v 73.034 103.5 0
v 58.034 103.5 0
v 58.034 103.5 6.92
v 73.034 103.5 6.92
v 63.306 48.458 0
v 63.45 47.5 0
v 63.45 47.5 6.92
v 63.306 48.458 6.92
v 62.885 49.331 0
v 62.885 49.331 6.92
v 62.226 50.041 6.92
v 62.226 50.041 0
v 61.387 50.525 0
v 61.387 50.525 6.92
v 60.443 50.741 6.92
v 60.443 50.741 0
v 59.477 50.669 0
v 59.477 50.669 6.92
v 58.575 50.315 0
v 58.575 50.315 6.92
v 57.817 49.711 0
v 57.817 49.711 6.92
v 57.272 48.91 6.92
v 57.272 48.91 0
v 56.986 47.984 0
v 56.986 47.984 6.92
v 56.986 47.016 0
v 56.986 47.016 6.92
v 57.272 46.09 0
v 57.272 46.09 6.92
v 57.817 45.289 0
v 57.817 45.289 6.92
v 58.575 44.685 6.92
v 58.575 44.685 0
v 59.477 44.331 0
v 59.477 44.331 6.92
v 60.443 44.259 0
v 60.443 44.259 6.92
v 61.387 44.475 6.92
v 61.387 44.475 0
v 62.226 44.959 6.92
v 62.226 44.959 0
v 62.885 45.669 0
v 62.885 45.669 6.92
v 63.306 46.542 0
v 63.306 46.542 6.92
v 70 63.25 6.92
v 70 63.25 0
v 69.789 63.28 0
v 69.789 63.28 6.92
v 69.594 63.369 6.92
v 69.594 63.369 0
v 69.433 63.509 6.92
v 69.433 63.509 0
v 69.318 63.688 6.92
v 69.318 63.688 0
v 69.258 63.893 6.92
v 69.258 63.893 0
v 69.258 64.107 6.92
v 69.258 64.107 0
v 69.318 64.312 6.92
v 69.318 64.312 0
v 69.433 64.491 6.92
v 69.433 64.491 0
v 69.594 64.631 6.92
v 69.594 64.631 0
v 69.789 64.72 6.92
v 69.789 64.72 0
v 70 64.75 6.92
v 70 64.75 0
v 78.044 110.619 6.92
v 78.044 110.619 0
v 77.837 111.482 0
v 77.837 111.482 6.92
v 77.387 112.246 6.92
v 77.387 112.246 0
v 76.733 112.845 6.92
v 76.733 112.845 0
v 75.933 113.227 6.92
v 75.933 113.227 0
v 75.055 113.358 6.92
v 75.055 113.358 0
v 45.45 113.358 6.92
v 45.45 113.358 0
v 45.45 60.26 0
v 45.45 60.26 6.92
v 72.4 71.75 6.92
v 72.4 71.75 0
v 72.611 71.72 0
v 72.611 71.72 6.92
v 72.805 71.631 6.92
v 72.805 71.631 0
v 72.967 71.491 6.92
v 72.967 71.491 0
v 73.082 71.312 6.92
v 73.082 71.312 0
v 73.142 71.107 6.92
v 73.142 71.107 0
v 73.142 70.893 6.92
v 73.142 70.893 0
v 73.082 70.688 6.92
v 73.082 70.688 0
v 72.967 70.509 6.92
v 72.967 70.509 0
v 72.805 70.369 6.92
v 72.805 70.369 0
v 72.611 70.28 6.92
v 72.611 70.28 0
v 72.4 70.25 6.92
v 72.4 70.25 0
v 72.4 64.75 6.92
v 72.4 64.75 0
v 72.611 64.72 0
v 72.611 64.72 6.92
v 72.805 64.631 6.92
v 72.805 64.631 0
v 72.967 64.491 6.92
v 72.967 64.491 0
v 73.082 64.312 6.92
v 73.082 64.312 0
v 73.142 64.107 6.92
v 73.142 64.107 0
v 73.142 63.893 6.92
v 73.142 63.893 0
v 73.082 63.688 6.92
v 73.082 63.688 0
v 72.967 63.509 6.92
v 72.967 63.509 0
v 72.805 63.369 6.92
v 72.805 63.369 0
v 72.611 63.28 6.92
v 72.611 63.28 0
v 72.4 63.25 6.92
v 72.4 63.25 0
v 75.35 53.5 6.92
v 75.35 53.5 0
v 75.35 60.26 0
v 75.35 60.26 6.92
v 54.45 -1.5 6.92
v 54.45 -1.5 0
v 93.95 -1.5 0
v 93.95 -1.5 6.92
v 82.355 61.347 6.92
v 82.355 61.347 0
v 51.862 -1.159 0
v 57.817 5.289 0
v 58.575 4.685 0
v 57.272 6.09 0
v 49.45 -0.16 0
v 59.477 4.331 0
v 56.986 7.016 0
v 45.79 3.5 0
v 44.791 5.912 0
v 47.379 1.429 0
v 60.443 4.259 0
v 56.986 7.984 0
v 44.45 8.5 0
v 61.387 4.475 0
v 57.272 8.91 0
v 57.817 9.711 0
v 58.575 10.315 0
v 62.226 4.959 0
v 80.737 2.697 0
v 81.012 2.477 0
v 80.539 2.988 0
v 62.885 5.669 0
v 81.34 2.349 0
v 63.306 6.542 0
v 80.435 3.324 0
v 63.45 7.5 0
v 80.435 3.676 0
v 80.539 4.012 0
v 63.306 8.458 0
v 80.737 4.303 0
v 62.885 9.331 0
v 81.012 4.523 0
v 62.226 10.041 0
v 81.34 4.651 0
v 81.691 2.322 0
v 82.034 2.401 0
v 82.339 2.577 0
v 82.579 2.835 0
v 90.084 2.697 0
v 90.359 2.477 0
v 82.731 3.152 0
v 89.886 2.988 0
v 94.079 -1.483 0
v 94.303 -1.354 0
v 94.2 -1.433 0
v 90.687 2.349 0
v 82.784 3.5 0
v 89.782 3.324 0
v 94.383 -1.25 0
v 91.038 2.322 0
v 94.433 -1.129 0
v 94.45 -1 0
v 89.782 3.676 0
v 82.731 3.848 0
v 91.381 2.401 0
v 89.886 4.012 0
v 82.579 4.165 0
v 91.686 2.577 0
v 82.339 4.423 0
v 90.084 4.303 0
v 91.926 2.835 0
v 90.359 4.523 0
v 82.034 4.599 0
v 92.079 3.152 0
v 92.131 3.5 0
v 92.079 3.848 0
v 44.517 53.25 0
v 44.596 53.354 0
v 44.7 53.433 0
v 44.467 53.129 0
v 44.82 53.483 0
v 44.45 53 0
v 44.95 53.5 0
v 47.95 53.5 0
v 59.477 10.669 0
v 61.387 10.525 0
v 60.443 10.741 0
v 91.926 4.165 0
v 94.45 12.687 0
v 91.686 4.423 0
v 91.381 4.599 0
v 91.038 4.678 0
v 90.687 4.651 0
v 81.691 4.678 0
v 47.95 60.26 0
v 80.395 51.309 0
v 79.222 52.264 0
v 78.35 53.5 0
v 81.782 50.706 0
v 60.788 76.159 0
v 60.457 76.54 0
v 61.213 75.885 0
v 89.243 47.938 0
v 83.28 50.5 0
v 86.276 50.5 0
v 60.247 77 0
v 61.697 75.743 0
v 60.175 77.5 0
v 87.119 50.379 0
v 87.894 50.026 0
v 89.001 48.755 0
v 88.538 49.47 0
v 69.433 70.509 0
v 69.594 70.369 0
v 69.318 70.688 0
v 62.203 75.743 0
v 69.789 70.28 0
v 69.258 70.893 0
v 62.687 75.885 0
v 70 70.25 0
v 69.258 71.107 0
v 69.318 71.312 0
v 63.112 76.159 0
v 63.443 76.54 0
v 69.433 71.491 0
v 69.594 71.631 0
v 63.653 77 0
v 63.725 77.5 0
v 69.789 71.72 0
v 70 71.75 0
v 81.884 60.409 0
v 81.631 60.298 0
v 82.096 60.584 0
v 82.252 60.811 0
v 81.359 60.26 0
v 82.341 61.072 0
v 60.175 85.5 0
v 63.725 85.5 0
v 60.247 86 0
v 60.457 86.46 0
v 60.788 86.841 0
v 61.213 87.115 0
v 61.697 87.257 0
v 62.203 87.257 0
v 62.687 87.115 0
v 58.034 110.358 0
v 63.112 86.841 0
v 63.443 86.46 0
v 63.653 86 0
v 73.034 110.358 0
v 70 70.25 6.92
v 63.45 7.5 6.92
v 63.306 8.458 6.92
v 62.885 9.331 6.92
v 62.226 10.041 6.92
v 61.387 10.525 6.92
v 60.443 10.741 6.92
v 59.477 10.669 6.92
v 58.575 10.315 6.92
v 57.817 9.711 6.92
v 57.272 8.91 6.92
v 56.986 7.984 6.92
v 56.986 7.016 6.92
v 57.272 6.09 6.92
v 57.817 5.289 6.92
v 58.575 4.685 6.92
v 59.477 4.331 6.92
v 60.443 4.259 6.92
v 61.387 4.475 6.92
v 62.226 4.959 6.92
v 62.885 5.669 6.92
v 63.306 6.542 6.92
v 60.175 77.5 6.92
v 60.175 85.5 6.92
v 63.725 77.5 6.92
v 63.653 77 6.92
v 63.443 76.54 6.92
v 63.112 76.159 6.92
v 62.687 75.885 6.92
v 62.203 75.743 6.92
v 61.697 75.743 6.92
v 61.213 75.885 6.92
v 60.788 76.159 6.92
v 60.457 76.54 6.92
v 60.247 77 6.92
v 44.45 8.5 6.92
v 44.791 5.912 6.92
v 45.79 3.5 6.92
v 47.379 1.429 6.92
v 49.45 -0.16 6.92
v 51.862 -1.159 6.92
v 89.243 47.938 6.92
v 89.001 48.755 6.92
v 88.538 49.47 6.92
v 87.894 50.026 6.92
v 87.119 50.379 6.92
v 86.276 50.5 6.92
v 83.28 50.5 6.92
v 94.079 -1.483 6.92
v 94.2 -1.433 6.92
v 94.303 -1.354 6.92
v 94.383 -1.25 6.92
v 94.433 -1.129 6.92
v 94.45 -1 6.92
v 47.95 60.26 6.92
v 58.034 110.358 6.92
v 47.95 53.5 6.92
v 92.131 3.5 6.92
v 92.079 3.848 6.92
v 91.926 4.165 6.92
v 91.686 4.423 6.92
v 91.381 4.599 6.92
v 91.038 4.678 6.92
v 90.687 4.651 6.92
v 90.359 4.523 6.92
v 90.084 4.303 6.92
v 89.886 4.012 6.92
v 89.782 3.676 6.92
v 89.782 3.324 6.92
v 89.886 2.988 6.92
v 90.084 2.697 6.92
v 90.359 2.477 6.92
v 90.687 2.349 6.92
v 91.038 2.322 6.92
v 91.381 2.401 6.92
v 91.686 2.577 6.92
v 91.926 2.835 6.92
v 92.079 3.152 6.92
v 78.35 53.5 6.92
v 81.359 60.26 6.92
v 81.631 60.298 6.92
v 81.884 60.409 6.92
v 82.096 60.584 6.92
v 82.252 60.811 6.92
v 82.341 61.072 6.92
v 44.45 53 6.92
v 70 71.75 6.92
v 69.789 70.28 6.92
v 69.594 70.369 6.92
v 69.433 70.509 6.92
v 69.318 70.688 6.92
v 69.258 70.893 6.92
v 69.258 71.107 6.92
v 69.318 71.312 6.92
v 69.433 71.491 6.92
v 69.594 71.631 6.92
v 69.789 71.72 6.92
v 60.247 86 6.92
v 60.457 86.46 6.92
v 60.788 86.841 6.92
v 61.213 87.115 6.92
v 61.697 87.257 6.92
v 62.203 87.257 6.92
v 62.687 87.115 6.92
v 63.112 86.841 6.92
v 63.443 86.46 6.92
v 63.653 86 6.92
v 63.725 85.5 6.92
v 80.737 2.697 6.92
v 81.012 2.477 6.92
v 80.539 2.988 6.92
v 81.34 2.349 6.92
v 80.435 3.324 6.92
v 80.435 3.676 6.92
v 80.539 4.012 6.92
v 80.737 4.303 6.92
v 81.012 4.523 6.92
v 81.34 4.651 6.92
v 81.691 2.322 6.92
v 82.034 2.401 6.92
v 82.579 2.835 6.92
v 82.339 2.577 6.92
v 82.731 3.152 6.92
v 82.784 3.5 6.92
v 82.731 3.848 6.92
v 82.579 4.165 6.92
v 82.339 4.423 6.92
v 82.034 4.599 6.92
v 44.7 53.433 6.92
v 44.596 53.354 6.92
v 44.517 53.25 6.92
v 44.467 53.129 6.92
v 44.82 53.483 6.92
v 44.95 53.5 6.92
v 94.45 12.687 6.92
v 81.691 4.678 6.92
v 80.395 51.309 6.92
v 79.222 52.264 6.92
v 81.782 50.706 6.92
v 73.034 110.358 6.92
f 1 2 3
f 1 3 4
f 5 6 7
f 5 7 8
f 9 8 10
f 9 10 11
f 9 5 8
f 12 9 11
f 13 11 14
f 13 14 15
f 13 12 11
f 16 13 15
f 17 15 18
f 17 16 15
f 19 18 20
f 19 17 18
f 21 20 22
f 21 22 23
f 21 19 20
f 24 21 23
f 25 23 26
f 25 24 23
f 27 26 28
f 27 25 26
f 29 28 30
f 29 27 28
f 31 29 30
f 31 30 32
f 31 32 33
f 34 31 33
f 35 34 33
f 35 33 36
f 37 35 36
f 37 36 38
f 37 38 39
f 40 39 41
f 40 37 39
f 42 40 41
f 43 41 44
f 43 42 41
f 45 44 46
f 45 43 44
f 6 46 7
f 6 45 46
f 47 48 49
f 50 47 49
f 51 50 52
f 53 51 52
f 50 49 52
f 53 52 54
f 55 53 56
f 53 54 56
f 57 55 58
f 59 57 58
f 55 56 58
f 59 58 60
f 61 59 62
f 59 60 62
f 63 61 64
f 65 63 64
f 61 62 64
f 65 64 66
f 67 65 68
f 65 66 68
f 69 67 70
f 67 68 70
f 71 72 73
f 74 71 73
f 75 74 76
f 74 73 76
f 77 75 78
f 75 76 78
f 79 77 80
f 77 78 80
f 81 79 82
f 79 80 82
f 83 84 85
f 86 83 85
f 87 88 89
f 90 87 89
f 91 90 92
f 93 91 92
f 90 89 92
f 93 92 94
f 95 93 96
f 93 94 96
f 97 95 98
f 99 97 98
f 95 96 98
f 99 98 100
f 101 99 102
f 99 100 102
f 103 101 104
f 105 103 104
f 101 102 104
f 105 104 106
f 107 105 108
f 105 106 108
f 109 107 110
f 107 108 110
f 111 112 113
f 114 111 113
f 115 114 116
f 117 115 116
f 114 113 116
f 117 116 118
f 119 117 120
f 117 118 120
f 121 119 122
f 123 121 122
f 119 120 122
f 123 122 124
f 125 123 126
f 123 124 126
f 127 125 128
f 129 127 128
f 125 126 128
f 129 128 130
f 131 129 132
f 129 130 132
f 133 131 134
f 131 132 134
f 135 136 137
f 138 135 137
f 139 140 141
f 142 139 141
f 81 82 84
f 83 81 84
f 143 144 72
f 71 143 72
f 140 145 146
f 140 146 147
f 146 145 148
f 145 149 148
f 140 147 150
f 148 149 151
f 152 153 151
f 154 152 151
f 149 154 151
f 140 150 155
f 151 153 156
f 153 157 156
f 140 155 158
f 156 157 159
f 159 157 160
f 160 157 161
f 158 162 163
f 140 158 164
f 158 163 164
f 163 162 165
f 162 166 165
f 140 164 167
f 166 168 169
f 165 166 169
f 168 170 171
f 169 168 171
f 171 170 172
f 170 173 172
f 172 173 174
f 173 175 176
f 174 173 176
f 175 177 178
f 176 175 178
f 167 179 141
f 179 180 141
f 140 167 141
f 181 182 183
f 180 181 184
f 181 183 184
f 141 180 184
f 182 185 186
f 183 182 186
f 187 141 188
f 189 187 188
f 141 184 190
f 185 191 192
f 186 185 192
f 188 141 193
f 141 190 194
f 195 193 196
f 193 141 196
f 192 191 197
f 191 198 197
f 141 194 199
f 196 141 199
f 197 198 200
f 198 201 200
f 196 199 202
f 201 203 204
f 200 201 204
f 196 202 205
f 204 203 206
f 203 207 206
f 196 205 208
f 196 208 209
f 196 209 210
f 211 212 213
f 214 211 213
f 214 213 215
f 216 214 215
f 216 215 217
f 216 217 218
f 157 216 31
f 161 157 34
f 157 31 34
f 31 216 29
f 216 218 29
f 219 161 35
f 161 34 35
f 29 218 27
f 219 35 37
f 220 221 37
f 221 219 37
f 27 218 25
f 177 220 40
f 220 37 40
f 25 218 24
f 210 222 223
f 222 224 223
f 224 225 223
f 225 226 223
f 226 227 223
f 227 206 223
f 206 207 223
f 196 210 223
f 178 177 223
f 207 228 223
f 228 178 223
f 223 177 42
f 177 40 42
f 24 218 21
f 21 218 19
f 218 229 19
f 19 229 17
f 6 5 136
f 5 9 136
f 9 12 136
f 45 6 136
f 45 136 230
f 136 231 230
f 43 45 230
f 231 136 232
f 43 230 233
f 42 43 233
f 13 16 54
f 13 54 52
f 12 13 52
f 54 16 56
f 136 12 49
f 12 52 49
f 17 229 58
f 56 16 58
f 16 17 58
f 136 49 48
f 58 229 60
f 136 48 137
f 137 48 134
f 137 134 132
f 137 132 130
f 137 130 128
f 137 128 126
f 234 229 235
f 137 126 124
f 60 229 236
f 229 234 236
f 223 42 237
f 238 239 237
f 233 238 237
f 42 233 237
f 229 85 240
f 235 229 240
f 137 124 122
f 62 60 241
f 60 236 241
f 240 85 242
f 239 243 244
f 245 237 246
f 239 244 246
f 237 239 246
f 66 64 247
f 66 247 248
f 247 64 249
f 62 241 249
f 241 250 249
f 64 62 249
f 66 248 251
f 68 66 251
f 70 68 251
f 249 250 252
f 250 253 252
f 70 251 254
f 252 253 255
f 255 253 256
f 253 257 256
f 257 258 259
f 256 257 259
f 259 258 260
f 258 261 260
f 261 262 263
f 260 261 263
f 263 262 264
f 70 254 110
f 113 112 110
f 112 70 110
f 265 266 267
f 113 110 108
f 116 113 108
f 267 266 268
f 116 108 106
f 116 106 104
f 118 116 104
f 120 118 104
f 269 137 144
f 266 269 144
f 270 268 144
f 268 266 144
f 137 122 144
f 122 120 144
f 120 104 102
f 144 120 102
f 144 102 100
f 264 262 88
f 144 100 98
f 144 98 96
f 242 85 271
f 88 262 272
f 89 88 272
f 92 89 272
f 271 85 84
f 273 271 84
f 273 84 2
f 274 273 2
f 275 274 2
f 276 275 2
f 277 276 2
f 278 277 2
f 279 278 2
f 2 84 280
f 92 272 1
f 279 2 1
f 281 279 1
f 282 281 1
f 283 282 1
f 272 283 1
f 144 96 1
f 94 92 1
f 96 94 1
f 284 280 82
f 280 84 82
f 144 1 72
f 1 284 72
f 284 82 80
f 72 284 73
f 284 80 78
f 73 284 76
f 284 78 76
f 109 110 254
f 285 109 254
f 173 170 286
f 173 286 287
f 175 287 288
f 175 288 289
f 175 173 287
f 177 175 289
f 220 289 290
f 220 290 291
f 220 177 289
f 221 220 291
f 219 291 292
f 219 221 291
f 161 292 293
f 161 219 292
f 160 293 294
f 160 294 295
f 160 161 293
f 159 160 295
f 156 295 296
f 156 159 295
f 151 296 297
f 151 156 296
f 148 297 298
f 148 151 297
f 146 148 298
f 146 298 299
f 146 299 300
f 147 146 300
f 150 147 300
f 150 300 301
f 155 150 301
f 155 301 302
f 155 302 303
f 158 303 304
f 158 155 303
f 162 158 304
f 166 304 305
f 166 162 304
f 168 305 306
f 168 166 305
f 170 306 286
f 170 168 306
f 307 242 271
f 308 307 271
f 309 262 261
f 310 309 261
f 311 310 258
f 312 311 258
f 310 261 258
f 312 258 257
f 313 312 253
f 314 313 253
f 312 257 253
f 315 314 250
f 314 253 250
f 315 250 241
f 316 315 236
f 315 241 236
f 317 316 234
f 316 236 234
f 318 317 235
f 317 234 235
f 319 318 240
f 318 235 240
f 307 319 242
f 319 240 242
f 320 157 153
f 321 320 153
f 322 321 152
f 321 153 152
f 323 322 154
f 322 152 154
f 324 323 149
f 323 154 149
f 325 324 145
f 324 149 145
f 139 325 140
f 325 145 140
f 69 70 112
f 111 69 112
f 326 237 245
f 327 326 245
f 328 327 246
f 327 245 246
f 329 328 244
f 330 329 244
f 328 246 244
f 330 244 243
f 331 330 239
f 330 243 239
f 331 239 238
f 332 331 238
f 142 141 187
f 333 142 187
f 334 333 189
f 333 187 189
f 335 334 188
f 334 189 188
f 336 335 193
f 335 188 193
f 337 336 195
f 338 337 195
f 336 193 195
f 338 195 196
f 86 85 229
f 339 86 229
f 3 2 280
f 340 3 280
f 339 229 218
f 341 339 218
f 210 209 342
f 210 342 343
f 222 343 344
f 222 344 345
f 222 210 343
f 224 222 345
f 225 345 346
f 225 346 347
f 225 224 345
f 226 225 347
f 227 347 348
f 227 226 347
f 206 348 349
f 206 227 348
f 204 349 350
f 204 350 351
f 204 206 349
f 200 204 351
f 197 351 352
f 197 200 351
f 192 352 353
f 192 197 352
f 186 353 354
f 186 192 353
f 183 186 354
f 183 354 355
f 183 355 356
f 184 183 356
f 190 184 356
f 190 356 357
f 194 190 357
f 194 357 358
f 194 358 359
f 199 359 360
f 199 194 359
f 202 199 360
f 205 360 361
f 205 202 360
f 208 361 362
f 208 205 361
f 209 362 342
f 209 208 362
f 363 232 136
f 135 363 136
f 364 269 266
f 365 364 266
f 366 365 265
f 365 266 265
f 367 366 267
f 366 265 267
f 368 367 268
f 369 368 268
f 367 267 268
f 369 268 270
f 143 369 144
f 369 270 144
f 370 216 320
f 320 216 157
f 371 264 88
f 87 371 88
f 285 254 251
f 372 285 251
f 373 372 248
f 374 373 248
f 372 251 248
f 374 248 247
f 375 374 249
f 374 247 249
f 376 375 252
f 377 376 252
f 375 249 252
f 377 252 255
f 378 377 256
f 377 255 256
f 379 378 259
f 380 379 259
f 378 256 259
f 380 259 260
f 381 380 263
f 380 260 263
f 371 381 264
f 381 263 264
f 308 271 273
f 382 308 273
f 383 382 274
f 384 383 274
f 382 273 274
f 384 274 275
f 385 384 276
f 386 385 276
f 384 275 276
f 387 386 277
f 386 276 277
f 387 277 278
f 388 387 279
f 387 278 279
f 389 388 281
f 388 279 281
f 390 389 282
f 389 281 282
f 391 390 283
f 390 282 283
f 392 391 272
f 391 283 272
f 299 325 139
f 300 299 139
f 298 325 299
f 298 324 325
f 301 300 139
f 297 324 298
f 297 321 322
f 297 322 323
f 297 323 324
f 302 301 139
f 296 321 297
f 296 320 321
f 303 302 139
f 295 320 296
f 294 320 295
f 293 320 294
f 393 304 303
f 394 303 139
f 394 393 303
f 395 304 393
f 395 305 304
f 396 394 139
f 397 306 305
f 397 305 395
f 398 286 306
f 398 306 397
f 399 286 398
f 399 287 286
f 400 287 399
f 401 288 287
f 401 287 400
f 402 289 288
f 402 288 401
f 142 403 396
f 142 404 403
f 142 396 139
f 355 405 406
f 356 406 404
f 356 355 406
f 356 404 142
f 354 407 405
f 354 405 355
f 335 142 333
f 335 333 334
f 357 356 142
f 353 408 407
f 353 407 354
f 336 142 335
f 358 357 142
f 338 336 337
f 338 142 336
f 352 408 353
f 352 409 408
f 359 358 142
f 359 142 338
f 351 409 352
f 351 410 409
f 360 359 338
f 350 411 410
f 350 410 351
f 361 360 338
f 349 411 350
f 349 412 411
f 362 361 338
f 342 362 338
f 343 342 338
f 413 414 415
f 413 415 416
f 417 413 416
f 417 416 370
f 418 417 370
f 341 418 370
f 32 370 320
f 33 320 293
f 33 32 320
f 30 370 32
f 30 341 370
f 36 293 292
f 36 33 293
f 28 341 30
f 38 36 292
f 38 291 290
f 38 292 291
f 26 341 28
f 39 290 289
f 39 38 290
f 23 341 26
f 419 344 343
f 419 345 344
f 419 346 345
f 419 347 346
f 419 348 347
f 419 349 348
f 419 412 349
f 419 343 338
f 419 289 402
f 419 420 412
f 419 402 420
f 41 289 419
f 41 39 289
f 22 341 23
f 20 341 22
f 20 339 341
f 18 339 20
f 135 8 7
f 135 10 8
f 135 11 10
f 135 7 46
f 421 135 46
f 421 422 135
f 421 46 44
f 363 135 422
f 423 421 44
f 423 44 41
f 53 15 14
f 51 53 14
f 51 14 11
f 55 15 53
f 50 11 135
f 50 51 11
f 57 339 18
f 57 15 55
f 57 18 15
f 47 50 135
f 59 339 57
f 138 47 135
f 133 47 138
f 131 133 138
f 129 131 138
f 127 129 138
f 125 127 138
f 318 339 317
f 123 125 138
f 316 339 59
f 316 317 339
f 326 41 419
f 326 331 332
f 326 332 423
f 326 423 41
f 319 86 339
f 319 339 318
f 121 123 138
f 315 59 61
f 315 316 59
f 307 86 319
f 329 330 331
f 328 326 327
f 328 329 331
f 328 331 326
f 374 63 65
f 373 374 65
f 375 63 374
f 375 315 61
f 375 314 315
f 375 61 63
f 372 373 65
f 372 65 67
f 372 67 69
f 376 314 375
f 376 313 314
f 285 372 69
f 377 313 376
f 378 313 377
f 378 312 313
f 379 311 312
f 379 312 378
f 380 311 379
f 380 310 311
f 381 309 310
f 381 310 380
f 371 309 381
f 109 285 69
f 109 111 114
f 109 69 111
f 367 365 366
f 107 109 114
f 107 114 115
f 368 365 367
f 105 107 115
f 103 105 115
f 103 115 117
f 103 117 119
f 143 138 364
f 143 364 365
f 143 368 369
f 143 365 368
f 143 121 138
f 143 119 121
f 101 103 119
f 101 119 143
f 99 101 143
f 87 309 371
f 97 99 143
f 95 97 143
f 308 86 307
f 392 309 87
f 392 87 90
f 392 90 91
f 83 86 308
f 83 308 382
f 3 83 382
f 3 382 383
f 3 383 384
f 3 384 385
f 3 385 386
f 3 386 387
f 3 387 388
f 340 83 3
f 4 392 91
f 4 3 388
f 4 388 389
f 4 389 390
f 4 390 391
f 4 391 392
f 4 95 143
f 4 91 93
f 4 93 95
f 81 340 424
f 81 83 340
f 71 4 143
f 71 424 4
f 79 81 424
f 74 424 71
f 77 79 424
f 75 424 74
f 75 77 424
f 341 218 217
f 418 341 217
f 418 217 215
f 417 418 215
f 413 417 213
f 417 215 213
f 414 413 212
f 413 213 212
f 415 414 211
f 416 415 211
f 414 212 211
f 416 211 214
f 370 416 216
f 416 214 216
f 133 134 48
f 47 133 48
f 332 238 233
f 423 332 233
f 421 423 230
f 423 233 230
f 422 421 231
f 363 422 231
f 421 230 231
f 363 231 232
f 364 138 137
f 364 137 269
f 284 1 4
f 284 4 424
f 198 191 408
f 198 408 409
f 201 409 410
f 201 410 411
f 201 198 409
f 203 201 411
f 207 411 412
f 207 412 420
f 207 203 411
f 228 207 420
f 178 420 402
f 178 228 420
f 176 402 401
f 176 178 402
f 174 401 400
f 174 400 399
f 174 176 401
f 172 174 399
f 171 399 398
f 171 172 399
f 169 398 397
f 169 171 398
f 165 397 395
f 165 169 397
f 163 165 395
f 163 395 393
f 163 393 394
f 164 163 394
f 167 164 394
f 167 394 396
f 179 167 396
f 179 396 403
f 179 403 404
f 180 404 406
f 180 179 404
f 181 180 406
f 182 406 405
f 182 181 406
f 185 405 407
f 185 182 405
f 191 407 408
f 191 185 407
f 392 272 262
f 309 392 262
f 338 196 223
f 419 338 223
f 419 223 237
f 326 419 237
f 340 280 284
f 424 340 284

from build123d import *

# Parameters (mm, degrees)
SKETCH1_R           = 3.25
SKETCH1_R_2         = 1.1811
SKETCH1_W           = 15
SKETCH1_H           = 6.858
BOSS_EXTRUDE1_DEPTH = 6.92


with BuildPart() as part:
    # Sketch1 → Boss-Extrude1 (new body)
    with BuildSketch(Plane.XY):
        with BuildLine():
            Line((54.449901472, -1.5), (93.949901472, -1.5))
            ThreePointArc((93.949901472, -1.5), (94.303454863, -1.353553391), (94.449901472, -1))
            Line((94.449901472, -1), (94.449901472, 12.686692025))
            Line((94.449901472, 12.686692025), (89.243377961, 47.938332641))
            ThreePointArc((89.243377961, 47.938332641), (88.235803145, 49.771012761), (86.275573302, 50.5))
            Line((86.275573302, 50.5), (83.280158812, 50.5))
            ThreePointArc((83.280158812, 50.5), (80.394529009, 51.308940401), (78.349901472, 53.5))
            Line((78.349901472, 53.5), (75.349901472, 53.5))
            Line((75.349901472, 53.5), (75.349901472, 60.26))
            Line((75.349901472, 60.26), (81.358592971, 60.26))
            ThreePointArc((81.358592971, 60.26), (82.095870308, 60.584409792), (82.354787669, 61.347155743))
            Line((82.354787669, 61.347155743), (78.044018988, 110.619467228))
            ThreePointArc((78.044018988, 110.619467228), (77.082205517, 112.56983201), (75.055434894, 113.358))
            Line((75.055434894, 113.358), (45.449901472, 113.358))
            Line((45.449901472, 113.358), (45.449901472, 60.26))
            Line((45.449901472, 60.26), (47.949901472, 60.26))
            Line((47.949901472, 60.26), (47.949901472, 53.5))
            Line((47.949901472, 53.5), (44.949901472, 53.5))
            ThreePointArc((44.949901472, 53.5), (44.596348081, 53.353553391), (44.449901472, 53))
            Line((44.449901472, 53), (44.449901472, 8.5))
            ThreePointArc((44.449901472, 8.5), (47.37883366, 1.428932188), (54.449901472, -1.5))
        make_face()
        with Locations((60.199901472, 47.5)):
            Circle(SKETCH1_R, mode=Mode.SUBTRACT)
        with Locations((60.199901472, 7.5)):
            Circle(SKETCH1_R, mode=Mode.SUBTRACT)
        with Locations((81.602701472, 3.5)):
            Circle(SKETCH1_R_2, mode=Mode.SUBTRACT)
        with Locations((90.949901472, 3.5)):
            Circle(SKETCH1_R_2, mode=Mode.SUBTRACT)
        with BuildLine():
            Line((72.399901472, 63.25), (69.999901472, 63.25))
            ThreePointArc((69.999901472, 63.25), (69.249901472, 64), (69.999901472, 64.75))
            Line((69.999901472, 64.75), (72.399901472, 64.75))
            ThreePointArc((72.399901472, 64.75), (73.149901472, 64), (72.399901472, 63.25))
        make_face(mode=Mode.SUBTRACT)
        with BuildLine():
            Line((72.399901472, 70.25), (69.999901472, 70.25))
            ThreePointArc((69.999901472, 70.25), (69.249901472, 71), (69.999901472, 71.75))
            Line((69.999901472, 71.75), (72.399901472, 71.75))
            ThreePointArc((72.399901472, 71.75), (73.149901472, 71), (72.399901472, 70.25))
        make_face(mode=Mode.SUBTRACT)
        with BuildLine():
            Line((60.174901472, 77.5), (60.174901472, 85.5))
            ThreePointArc((60.174901472, 85.5), (61.949901472, 87.275), (63.724901472, 85.5))
            Line((63.724901472, 85.5), (63.724901472, 77.5))
            ThreePointArc((63.724901472, 77.5), (61.949901472, 75.725), (60.174901472, 77.5))
        make_face(mode=Mode.SUBTRACT)
        with Locations((65.533922881, 106.929)):
            Rectangle(SKETCH1_W, SKETCH1_H, mode=Mode.SUBTRACT)
    extrude(amount=BOSS_EXTRUDE1_DEPTH)


solid = part.part
